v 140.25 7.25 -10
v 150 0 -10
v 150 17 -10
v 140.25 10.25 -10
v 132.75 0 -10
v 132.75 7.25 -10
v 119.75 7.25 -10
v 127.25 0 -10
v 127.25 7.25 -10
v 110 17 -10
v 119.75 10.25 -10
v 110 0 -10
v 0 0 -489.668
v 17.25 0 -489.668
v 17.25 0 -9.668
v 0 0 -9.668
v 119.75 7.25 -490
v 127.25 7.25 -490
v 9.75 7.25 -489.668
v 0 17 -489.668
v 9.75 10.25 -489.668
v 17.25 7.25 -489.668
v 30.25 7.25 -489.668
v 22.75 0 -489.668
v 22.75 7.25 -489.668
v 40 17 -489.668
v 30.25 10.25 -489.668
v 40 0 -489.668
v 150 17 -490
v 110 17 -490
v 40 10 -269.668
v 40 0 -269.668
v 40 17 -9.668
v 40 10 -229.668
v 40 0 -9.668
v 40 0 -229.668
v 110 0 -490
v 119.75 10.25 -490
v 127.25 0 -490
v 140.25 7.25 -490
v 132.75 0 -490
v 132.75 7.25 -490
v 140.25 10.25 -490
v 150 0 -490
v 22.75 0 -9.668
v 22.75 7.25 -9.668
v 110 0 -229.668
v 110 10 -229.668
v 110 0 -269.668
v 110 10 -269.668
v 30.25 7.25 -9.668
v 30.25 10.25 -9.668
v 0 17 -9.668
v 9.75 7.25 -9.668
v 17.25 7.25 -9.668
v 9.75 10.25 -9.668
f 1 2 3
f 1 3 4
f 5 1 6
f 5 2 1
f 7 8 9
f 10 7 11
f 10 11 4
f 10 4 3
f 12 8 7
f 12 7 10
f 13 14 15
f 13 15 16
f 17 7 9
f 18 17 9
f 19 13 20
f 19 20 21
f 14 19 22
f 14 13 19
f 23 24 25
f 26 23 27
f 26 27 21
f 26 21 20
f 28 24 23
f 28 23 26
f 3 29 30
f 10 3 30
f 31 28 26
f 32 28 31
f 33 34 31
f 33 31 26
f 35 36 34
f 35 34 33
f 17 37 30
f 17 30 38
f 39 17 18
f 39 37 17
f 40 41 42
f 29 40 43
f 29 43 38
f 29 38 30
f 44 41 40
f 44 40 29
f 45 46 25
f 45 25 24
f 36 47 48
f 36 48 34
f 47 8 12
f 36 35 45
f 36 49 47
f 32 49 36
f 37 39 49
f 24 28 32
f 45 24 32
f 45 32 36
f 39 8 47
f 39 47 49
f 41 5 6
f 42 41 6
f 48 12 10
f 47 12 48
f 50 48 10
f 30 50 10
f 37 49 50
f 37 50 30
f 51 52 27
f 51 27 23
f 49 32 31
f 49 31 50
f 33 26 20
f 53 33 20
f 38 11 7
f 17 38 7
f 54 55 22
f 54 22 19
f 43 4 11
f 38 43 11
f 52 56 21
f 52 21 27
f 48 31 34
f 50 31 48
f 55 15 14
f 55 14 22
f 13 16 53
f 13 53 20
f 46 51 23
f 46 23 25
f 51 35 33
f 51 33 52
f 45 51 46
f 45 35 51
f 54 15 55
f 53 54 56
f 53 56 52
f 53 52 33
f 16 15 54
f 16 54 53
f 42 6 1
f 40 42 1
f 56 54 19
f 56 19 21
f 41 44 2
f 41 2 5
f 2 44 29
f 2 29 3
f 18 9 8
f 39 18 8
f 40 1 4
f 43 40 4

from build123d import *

# Parameters (mm, degrees)
BOSS_EXTRUDE1_DEPTH = 17
SKETCH2_W           = 70
SKETCH2_H           = 40
CUT_EXTRUDE1_DEPTH  = 7
CUT_EXTRUDE2_DEPTH  = 481.331856029


with BuildPart() as part:
    # Sketch1 → Boss-Extrude1 (new body)
    with BuildSketch(Plane(origin=(0, 0, 0), x_dir=(1, 0, 0), z_dir=(0, 1, 0))):
        Polygon((40, 489.668143971), (40, 269.668143971), (110, 269.668143971), (110, 490), (150, 490), (150, 10), (110, 10), (110, 229.668143971), (40, 229.668143971), (40, 9.668143971), (0, 9.668143971), (0, 489.668143971), align=None)
    extrude(amount=BOSS_EXTRUDE1_DEPTH)

    # Sketch2 → Cut-Extrude1 (cut)
    with BuildSketch(Plane(origin=(0, 17, 0), x_dir=(1, 0, 0), z_dir=(0, 1, 0))):
        with Locations((75, 249.668143971)):
            Rectangle(SKETCH2_W, SKETCH2_H)
    extrude(amount=-CUT_EXTRUDE1_DEPTH, mode=Mode.SUBTRACT)

    # Sketch3 → Cut-Extrude2 (cut, through all)
    with BuildSketch(Plane.XY.offset(-9.668143971)):
        Polygon((17.25, 0), (17.25, 7.25), (9.75, 7.25), (9.75, 10.25), (30.25, 10.25), (30.25, 7.25), (22.75, 7.25), (22.75, 0), align=None)
    cut_extrude2 = extrude(amount=-CUT_EXTRUDE2_DEPTH, mode=Mode.SUBTRACT)

    # Mirror1: Cut-Extrude2 across plane
    add(cut_extrude2.mirror(Plane(origin=(75, 0, 0), x_dir=(0, 0, 1), z_dir=(1, 0, 0))), mode=Mode.SUBTRACT)


solid = part.part
